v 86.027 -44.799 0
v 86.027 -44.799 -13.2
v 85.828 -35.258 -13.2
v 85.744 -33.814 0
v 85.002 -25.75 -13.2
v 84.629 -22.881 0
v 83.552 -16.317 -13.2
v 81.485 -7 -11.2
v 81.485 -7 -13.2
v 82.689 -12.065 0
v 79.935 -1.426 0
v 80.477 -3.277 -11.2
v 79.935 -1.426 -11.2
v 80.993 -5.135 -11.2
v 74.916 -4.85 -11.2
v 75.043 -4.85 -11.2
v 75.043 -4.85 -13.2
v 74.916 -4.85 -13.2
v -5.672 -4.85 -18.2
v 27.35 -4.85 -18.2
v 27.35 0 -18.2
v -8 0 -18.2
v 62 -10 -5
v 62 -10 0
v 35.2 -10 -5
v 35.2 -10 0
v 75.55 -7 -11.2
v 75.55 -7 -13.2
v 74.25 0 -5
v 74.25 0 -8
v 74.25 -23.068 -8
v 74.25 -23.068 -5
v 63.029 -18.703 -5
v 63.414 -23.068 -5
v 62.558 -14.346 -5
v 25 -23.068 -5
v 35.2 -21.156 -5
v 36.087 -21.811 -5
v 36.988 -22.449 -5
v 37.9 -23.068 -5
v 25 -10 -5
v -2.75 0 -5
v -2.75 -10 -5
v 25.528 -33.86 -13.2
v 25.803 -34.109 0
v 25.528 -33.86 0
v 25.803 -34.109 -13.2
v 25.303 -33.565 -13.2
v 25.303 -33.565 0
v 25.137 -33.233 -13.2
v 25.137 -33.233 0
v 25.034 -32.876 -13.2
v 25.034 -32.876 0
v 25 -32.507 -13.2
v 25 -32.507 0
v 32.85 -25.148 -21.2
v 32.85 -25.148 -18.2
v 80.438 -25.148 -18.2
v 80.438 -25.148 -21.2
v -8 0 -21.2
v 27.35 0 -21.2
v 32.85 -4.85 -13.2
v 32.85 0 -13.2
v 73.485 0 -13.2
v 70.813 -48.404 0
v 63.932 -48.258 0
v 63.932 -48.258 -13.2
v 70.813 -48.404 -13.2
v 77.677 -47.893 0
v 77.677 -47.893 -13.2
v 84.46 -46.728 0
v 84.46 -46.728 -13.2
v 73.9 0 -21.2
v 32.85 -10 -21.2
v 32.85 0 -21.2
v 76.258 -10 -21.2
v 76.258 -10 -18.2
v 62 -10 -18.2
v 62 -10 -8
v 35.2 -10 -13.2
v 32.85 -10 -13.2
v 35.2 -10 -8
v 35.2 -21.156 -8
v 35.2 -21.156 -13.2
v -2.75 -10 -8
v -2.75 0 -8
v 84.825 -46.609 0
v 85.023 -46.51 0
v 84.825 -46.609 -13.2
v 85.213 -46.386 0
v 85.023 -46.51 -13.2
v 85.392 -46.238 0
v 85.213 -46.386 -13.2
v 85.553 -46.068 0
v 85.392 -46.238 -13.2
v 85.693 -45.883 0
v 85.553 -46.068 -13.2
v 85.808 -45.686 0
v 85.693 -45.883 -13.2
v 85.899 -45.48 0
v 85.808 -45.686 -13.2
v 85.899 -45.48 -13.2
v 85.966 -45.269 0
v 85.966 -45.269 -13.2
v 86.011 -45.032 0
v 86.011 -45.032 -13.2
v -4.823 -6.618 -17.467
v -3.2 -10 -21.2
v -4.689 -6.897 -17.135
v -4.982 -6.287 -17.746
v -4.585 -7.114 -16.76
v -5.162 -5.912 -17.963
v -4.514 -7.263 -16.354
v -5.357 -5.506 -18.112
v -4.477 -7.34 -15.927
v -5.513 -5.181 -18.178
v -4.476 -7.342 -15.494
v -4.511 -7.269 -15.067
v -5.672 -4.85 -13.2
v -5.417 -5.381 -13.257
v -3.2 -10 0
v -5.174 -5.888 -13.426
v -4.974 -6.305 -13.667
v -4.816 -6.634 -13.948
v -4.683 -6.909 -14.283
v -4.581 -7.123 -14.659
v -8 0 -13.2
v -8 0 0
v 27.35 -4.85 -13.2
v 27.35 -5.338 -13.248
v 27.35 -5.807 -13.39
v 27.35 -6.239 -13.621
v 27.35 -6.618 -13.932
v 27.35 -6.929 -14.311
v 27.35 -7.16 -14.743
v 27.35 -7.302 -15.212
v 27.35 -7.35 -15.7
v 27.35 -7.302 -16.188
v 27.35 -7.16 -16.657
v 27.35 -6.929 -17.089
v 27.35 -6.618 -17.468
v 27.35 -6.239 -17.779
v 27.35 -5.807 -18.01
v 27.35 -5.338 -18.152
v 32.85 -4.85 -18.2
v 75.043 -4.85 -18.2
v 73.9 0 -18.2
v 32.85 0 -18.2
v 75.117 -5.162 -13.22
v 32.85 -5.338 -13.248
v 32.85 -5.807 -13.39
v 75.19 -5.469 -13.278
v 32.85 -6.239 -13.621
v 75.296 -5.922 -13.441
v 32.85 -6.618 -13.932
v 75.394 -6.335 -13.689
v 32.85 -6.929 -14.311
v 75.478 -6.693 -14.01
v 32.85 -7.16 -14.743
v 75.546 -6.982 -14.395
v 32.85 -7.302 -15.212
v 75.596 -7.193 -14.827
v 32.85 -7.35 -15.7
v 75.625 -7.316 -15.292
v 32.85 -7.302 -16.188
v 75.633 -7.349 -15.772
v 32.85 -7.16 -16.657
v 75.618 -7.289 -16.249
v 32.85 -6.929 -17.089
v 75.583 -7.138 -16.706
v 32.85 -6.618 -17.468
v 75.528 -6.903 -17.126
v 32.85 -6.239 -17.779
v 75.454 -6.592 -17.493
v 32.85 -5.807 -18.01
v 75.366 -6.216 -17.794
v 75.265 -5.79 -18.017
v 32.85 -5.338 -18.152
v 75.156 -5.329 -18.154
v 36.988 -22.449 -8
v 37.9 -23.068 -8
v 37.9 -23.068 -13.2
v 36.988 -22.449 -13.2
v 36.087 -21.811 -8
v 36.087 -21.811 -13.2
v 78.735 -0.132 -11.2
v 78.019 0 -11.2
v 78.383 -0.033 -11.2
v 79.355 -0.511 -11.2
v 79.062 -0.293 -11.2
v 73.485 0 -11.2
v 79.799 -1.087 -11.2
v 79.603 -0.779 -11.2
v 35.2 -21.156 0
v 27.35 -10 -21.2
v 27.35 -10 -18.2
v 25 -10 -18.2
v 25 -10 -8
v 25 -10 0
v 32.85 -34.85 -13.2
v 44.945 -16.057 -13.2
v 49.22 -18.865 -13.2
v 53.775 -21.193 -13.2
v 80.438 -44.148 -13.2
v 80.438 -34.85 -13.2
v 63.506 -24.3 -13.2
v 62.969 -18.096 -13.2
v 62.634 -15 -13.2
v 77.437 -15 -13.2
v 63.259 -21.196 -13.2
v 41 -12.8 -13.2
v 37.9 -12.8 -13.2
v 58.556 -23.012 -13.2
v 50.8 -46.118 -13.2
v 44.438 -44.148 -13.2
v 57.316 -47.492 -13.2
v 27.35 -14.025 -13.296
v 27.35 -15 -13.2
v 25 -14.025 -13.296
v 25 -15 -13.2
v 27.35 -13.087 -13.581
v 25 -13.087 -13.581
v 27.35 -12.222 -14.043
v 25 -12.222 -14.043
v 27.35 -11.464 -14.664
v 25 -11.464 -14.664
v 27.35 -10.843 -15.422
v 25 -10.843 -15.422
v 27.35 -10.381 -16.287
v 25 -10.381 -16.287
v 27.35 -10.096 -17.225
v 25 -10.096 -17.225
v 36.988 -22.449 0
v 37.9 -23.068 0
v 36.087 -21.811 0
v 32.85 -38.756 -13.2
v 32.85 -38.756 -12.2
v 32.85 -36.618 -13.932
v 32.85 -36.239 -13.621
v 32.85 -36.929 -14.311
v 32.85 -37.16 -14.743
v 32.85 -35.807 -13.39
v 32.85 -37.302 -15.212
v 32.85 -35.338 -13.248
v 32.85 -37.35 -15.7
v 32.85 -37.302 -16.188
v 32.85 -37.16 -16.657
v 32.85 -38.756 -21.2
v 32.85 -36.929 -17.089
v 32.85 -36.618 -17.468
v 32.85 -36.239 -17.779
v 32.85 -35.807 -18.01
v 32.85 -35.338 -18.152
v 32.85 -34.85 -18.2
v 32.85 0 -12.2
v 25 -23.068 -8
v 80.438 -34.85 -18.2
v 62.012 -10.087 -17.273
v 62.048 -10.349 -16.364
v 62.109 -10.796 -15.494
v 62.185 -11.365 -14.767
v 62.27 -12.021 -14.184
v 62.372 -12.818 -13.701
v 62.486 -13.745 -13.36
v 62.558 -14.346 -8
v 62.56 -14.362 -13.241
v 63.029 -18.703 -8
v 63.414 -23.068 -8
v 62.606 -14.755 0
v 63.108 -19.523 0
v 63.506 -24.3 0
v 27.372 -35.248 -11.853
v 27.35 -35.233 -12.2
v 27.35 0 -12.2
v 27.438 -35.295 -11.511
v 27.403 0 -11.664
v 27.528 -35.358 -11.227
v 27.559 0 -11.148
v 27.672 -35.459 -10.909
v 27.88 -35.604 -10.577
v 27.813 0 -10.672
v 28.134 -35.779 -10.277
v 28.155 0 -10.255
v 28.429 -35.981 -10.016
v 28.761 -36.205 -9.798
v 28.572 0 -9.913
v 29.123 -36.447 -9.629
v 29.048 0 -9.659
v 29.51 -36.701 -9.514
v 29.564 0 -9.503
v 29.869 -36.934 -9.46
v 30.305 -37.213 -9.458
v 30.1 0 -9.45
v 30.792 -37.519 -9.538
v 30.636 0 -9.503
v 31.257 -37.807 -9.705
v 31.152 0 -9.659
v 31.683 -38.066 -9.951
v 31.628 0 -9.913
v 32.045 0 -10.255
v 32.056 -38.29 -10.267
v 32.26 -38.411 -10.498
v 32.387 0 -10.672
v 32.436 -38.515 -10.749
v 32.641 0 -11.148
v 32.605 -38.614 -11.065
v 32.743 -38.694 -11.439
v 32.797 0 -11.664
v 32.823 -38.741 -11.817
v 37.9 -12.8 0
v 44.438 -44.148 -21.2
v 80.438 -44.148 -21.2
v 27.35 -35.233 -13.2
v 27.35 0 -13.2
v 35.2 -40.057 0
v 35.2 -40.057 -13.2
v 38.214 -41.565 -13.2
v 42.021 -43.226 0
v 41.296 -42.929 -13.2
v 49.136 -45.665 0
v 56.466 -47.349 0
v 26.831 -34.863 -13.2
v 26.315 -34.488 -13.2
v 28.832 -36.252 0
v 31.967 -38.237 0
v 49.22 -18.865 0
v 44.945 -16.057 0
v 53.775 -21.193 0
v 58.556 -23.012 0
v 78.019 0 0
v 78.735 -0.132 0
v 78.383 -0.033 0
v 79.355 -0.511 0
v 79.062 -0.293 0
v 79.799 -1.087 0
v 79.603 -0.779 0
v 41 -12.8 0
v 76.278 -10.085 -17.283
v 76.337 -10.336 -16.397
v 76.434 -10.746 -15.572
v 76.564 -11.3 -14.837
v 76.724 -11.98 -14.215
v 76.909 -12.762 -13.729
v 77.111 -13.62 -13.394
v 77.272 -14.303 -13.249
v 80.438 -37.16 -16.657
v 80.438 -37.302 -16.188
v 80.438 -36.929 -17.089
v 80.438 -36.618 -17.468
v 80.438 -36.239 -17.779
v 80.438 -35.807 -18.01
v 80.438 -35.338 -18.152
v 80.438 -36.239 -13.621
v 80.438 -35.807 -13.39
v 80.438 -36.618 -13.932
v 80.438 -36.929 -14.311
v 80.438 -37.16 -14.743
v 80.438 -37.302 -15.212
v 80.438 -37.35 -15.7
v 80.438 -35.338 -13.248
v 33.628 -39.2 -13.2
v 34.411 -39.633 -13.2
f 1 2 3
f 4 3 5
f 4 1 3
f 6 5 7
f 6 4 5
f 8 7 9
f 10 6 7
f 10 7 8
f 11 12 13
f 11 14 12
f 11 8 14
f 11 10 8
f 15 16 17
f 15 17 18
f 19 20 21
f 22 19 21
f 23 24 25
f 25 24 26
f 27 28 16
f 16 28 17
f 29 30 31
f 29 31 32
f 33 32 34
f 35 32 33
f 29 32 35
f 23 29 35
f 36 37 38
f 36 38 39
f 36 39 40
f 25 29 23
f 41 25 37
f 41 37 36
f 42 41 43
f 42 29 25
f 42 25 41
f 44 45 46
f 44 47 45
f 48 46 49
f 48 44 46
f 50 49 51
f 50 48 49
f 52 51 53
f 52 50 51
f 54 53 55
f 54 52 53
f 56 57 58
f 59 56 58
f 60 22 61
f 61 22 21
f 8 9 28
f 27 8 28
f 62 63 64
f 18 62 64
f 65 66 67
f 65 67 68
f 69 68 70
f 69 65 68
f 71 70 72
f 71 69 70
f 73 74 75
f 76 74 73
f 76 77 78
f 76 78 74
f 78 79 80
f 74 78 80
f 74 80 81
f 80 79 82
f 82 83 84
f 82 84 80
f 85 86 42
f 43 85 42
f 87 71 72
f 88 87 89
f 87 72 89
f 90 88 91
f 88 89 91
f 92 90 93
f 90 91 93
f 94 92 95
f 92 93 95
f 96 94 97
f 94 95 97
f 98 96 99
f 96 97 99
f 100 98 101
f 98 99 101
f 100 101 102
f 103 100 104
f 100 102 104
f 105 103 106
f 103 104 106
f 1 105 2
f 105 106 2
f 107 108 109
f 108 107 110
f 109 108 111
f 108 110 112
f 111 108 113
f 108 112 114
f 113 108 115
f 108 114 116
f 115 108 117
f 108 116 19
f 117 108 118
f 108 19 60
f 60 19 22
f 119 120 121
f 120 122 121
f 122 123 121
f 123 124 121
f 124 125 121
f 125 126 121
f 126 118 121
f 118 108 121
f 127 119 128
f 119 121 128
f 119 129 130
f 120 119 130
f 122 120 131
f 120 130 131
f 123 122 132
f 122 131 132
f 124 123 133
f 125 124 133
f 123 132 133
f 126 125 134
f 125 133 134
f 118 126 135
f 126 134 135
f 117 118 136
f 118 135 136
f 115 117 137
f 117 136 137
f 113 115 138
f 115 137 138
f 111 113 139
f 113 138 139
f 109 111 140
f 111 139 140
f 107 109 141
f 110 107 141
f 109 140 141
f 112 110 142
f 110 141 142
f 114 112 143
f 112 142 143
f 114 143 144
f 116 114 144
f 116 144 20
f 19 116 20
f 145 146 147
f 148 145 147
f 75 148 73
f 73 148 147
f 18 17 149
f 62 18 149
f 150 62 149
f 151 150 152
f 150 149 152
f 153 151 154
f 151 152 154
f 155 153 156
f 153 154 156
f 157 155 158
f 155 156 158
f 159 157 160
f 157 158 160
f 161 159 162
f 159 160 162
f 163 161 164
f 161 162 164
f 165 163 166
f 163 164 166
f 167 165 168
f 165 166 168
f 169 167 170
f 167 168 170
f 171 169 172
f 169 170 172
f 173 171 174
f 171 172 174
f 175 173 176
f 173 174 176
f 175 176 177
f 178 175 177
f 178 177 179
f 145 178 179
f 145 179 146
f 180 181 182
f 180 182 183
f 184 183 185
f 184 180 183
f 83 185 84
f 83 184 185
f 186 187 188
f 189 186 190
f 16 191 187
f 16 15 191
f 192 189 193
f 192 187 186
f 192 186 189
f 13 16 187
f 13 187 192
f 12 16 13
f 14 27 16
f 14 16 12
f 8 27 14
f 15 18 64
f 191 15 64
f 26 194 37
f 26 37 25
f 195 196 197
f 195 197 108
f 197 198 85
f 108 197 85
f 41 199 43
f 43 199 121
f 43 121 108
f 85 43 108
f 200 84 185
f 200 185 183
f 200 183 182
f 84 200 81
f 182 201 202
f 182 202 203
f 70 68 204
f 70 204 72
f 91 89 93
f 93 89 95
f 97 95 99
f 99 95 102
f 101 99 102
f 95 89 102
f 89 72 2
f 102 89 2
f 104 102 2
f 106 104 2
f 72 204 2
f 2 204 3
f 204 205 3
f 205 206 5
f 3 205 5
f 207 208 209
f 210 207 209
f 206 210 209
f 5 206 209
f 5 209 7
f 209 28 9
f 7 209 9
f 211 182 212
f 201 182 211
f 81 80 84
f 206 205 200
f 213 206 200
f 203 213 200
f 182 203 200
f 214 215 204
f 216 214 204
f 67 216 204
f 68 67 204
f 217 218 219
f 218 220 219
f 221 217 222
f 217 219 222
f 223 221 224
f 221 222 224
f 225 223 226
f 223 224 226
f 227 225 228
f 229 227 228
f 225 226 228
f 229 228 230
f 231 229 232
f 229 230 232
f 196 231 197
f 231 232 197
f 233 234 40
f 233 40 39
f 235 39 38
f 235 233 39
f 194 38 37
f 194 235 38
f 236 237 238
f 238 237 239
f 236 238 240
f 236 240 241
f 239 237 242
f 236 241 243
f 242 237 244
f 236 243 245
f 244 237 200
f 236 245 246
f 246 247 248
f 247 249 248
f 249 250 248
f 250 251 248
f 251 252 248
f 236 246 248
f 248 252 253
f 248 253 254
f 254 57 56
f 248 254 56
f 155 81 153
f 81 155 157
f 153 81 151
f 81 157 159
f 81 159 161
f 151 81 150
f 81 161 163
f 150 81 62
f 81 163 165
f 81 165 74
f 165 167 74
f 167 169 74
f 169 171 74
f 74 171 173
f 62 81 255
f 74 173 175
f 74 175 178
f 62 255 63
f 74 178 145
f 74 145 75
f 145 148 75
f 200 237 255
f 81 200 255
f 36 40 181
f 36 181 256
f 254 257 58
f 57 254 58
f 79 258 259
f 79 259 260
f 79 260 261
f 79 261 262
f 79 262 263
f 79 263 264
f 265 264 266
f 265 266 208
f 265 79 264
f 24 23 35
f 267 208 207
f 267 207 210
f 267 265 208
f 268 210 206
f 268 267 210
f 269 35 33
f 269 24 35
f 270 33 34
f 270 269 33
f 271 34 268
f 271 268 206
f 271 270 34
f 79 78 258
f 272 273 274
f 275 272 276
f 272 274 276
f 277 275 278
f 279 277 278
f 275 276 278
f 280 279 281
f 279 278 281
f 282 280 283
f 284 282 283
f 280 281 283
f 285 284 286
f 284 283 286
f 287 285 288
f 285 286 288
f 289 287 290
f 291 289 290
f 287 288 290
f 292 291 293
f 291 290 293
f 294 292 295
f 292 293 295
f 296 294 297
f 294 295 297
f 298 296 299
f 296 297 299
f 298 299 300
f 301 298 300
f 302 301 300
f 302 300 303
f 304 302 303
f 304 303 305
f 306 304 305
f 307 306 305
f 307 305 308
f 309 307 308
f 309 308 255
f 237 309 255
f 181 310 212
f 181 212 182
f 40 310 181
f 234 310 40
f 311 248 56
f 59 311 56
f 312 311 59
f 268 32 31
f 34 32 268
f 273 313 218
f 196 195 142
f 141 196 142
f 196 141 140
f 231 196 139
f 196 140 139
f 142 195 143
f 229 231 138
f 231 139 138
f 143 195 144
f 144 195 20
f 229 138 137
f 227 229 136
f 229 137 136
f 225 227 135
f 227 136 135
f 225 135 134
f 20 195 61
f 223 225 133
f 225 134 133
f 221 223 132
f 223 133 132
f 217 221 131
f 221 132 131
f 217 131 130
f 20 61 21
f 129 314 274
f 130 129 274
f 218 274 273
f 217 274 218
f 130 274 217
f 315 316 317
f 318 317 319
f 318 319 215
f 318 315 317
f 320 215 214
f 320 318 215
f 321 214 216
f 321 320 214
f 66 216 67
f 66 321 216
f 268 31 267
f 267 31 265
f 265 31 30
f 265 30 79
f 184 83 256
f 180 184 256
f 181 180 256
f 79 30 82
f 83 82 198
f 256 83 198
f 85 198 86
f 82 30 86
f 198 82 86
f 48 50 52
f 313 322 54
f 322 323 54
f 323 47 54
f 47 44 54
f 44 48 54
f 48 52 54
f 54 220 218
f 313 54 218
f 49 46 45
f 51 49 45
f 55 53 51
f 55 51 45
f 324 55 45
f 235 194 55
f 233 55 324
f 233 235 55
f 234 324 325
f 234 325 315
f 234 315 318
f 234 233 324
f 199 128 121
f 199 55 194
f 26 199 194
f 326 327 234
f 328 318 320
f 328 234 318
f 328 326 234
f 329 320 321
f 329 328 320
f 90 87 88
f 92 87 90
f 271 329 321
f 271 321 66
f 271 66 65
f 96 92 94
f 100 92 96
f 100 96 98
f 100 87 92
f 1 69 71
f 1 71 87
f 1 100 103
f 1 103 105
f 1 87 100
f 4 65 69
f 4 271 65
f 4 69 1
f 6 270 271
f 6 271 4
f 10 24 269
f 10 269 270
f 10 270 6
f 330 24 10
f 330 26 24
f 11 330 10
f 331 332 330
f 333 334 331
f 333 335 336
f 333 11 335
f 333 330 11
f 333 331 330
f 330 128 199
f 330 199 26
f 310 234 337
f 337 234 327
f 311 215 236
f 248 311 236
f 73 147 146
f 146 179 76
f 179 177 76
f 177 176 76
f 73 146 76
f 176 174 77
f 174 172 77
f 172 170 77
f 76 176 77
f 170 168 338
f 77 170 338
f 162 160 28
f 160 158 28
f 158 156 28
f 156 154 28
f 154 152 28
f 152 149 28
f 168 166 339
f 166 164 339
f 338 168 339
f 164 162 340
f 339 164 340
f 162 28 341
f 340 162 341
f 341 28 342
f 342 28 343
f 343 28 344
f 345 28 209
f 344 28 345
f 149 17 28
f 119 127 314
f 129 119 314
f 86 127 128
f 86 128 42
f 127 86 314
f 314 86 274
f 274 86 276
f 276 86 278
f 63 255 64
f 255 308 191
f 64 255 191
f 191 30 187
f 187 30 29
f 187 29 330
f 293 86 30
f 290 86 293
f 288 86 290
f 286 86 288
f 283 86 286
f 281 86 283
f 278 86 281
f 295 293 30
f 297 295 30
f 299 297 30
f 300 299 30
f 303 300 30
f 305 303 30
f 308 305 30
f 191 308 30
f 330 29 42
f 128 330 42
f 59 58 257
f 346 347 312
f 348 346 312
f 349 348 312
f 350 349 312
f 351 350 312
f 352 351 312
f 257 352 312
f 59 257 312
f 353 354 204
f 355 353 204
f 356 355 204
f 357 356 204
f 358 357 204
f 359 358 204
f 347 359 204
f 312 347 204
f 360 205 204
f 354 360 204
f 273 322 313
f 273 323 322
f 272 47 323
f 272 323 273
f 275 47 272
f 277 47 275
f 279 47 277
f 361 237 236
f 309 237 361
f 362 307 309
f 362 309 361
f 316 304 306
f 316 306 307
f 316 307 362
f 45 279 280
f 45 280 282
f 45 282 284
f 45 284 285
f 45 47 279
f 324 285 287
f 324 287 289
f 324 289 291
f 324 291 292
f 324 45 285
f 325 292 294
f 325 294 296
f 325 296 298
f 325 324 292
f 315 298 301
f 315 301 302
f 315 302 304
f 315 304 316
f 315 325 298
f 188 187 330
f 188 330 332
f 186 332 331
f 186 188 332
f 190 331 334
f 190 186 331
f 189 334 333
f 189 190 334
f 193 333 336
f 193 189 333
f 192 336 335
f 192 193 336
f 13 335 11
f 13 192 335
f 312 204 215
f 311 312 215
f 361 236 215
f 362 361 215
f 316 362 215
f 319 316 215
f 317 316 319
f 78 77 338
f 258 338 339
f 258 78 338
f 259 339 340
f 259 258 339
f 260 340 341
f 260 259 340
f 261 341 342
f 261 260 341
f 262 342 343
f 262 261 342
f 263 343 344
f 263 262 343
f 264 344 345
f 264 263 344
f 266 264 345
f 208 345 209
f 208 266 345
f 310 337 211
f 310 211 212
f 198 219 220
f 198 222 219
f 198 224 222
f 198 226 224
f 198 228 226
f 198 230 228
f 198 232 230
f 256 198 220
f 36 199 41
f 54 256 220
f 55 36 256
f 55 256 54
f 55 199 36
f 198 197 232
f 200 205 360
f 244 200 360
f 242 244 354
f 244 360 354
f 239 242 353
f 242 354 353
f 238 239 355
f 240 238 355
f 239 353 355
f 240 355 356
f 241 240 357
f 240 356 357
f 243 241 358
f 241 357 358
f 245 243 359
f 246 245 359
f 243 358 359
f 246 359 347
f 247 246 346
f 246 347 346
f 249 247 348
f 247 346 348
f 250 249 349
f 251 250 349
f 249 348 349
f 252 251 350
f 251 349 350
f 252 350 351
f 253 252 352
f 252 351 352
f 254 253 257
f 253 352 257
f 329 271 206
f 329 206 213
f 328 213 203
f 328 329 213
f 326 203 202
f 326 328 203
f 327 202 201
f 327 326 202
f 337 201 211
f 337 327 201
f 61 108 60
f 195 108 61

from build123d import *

# Parameters (mm, degrees)
F1_DEPTH  = 13.2
F3_DEPTH  = 8
F5_DEPTH  = 88.4390001176
F7_DEPTH  = 48.4308042409
F6_W      = 77
F6_H      = 3
F8_DEPTH  = 12.8
F9_R      = 5
F10_R     = 2
F12_DEPTH = 2
F13_W     = 40.65
F13_H     = 3
F13_W_2   = 12.25
F14_DEPTH = 23.0683441528


# Not quite as in the source:
# - a feature names something its author has since deleted; it is built from what else it names


with BuildPart() as f1:
    # F0 (on Top) → F1 (new body)
    with BuildSketch(Plane.XY):
        with BuildLine():
            Line((-3.2, -10), (4.8, -10))
            Line((4.8, -10), (25, -10))
            Line((25, -10), (25, -33.5))
            ThreePointArc((25, -33.5), (29.9617064043, -36.9938363193), (35.2, -40.0574457714))
            Line((35.2, -40.0574457714), (35.2, -21.1564938874))
            Line((35.2, -21.1564938874), (35.2, -10))
            Line((35.2, -10), (62, -10))
            ThreePointArc((62, -10), (62.8699868465, -17.1376907215), (63.5062507441, -24.3))
            ThreePointArc((63.5062507441, -24.3), (63.7566330876, -28.252847646), (63.9358126513, -32.2095622573))
            ThreePointArc((63.9358126513, -32.2095622573), (64.0273561468, -35.3542873695), (64.0739210442, -38.5))
            ThreePointArc((64.0739210442, -38.5), (64.0571349812, -43.3799777622), (63.9321127792, -48.258382643))
            ThreePointArc((63.9321127792, -48.258382643), (75.0391386854, -48.167385668), (86, -46.3691019944))
            ThreePointArc((86, -46.3691019944), (84.6340109104, -22.9204511896), (79.5, 0))
            Line((79.5, 0), (0, 0))
            Line((0, 0), (-8, 0))
            Line((-8, 0), (-3.2, -10))
        make_face()
        with BuildLine():
            Line((35.2, -21.1564938874), (35.2, -40.0574457714))
            ThreePointArc((35.2, -40.0574457714), (49.1359582734, -45.6647697988), (63.9321127792, -48.258382643))
            ThreePointArc((63.9321127792, -48.258382643), (64.0571349812, -43.3799777622), (64.0739210442, -38.5))
            ThreePointArc((64.0739210442, -38.5), (50.2282447294, -34.8385677857), (37.9, -27.55))
            Line((37.9, -27.55), (37.9, -23.0683441528))
            ThreePointArc((37.9, -23.0683441528), (36.5358784648, -22.1323620803), (35.2, -21.1564938874))
        make_face()
        with BuildLine():
            Line((37.9, -12.8), (37.9, -23.0683441528))
            ThreePointArc((37.9, -23.0683441528), (50.346051903, -29.2676961626), (63.9358126513, -32.2095622573))
            ThreePointArc((63.9358126513, -32.2095622573), (63.7566330876, -28.252847646), (63.5062507441, -24.3))
            ThreePointArc((63.5062507441, -24.3), (51.465613735, -20.0912116842), (41, -12.8))
            Line((41, -12.8), (37.9, -12.8))
        make_face()
        with BuildLine():
            ThreePointArc((63.9358126513, -32.2095622573), (50.346051903, -29.2676961626), (37.9, -23.0683441528))
            Line((37.9, -23.0683441528), (37.9, -27.55))
            ThreePointArc((37.9, -27.55), (50.2282447294, -34.8385677857), (64.0739210442, -38.5))
            ThreePointArc((64.0739210442, -38.5), (64.0273561468, -35.3542873695), (63.9358126513, -32.2095622573))
        make_face()
    extrude(amount=-F1_DEPTH)

    # F2 (on face) → F3 (join)
    with BuildSketch(Plane(origin=(0, 0, -13.2), x_dir=(1, 0, 0), z_dir=(0, 0, -1))):
        Polygon((0.35, 0), (27.35, 0), (27.35, 10), (25, 10), (-3.2, 10), (-8, 0), align=None)
        Polygon((32.85, 10), (32.85, 0), (73.9, 0), (76.2576692783, 10), (62, 10), (35.2, 10), align=None)
        Polygon((32.85, 25.1478344245), (80.4380001176, 25.1478344245), (80.4380001176, 44.1478344245), (44.4380001176, 44.1478344245), (32.85, 38.7561702211), align=None)
    extrude(amount=F3_DEPTH)

    # F4 (on face) → F5 (cut, through all)
    with BuildSketch(Plane.YZ.offset(80.4380001176)):
        with BuildLine():
            Line((0, -18.2), (0, -13.2))
            Line((0, -13.2), (-4.85, -13.2))
            ThreePointArc((-4.85, -13.2), (-7.35, -15.7), (-4.85, -18.2))
            Line((-4.85, -18.2), (0, -18.2))
        make_face()
        with BuildLine():
            Line((-34.85, -18.2), (-30, -18.2))
            Line((-30, -18.2), (-25.1478344245, -18.2))
            Line((-25.1478344245, -18.2), (-25.1478344245, -13.2))
            Line((-25.1478344245, -13.2), (-30, -13.2))
            Line((-30, -13.2), (-34.85, -13.2))
            ThreePointArc((-34.85, -13.2), (-37.35, -15.7), (-34.85, -18.2))
        make_face()
    extrude(amount=-F5_DEPTH, mode=Mode.SUBTRACT)

    # F6 (on face) → F7 (cut, through all)
    with BuildSketch(Plane(origin=(0, 0, 0), x_dir=(-1, 0, 0), z_dir=(0, 1, 0))):
        with BuildLine():
            Line((-32.85, -13.2), (-27.35, -13.2))
            Line((-27.35, -13.2), (-27.35, -12.2))
            ThreePointArc((-27.35, -12.2), (-30.1, -9.45), (-32.85, -12.2))
            Line((-32.85, -12.2), (-32.85, -13.2))
        make_face()
    extrude(amount=-F7_DEPTH, mode=Mode.SUBTRACT)

    # F6 (on face) → F8 (cut, through all)
    with BuildSketch(Plane(origin=(0, 0, 0), x_dir=(-1, 0, 0), z_dir=(0, 1, 0))):
        with Locations((-35.75, -6.5)):
            Rectangle(F6_W, F6_H)
    extrude(amount=-F8_DEPTH, mode=Mode.SUBTRACT)

    # F9
    f9_edges = [f1.edges().sort_by_distance(p)[0] for p in [
        (69.128835, -10, -13.2),
        (26.175, -10, -13.2),
    ]]
    fillet(f9_edges, radius=F9_R)

    # F10
    f10_edges = [f1.edges().sort_by_distance(p)[0] for p in [
        (86, -46.369102, -6.6),
        (79.5, 0, -6.6),
        (25, -33.5, -6.6),
    ]]
    fillet(f10_edges, radius=F10_R)

    # F11 (on face) → F12 (cut)
    with BuildSketch(Plane(origin=(0, 0, -13.2), x_dir=(1, 0, 0), z_dir=(0, 0, -1))):
        with BuildLine():
            Line((73.4852175089, 0), (78.0194737362, 0))
            ThreePointArc((78.0194737362, 0), (79.2135753482, 0.39559315), (79.9352985421, 1.4258786598))
            ThreePointArc((79.9352985421, 1.4258786598), (80.7380621658, 4.2052082165), (81.4852175089, 7))
            Line((81.4852175089, 7), (75.5503684948, 7))
            Line((75.5503684948, 7), (75.0434696, 4.85))
            Line((75.0434696, 4.85), (74.9160721206, 4.85))
            Line((74.9160721206, 4.85), (73.4852175089, 0))
        make_face()
    extrude(amount=-F12_DEPTH, mode=Mode.SUBTRACT)

    # F13 (on face) → F14 (cut, through all)
    with BuildSketch(Plane(origin=(0, 0, 0), x_dir=(-1, 0, 0), z_dir=(0, 1, 0))):
        with Locations((-17.575, -6.5)):
            Rectangle(F13_W, F13_H)
        with Locations((-68.125, -6.5)):
            Rectangle(F13_W_2, F13_H)
    extrude(amount=-F14_DEPTH, mode=Mode.SUBTRACT)


solid = f1.part
